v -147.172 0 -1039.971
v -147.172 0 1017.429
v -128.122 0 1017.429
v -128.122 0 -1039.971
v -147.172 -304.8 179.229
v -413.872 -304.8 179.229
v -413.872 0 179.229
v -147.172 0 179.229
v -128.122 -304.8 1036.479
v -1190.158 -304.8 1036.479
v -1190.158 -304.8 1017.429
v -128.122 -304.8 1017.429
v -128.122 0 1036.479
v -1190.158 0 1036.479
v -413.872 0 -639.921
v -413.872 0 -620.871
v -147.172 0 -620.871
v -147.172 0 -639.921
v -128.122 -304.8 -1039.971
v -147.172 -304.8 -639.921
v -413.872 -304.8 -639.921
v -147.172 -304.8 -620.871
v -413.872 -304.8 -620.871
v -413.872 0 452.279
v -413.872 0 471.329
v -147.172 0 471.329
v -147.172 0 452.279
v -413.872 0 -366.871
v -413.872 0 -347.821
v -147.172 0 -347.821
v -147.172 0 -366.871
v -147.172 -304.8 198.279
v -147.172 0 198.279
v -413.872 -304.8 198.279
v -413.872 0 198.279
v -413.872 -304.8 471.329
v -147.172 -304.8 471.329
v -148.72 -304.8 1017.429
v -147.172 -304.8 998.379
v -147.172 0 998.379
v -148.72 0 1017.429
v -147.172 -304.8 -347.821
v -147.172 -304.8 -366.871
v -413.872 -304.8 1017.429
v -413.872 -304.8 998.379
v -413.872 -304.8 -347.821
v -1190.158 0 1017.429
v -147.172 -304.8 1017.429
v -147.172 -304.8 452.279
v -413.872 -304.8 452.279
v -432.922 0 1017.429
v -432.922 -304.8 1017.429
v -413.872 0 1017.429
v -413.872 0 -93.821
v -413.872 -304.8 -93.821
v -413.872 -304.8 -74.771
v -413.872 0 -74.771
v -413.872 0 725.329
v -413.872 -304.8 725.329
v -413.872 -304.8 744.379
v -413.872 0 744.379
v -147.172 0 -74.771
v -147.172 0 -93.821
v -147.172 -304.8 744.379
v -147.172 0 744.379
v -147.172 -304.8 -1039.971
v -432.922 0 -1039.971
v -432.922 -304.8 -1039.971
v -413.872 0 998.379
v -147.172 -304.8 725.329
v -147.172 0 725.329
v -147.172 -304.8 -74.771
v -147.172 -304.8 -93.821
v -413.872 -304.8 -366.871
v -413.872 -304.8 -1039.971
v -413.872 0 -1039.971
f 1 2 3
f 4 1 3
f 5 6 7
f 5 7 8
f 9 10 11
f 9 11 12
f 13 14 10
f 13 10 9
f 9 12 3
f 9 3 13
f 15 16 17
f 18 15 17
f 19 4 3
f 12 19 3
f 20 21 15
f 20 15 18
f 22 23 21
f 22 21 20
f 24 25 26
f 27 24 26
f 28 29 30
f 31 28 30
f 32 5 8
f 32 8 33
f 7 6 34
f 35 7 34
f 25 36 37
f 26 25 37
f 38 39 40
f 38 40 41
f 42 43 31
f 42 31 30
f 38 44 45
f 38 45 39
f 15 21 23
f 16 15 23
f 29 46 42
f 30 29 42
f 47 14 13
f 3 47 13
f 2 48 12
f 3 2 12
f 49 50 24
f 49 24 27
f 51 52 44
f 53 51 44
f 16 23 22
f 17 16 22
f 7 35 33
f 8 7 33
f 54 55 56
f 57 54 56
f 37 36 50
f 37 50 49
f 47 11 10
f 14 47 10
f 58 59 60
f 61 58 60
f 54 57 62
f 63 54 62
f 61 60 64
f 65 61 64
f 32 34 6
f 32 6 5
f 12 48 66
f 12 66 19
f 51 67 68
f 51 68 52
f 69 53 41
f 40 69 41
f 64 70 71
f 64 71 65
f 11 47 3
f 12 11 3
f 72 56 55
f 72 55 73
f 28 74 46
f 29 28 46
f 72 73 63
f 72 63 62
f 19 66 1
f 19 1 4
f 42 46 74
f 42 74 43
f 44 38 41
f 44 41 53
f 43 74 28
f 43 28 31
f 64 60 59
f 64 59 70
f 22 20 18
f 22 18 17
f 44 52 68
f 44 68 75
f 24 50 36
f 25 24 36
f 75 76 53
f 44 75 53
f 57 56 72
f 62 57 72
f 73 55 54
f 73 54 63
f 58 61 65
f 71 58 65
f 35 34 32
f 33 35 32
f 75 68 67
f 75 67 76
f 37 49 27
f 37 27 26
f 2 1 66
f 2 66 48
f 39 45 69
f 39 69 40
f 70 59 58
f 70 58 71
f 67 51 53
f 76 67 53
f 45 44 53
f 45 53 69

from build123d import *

# Parameters (mm, degrees)
F0_W     = 19.05
F0_H     = 2057.4
F1_DEPTH = 304.8
F2_W     = 266.7
F2_H     = 19.05
F3_DEPTH = 304.8
F4_W     = 1062.035602
F4_H     = 19.05
F5_DEPTH = 304.8


with BuildPart() as f1:
    # F0 (on Front) → F1 (new body)
    with BuildSketch(Plane.XZ):
        with Locations((-423.397244, -11.271086)):
            Rectangle(F0_W, F0_H)
        with Locations((-137.647244, -11.271086)):
            Rectangle(F0_W, F0_H)
    extrude(amount=F1_DEPTH)


with BuildPart() as f3:
    # F2 (on face) → F3 (new body)
    with BuildSketch(Plane.XZ.offset(304.8)):
        with Locations((-280.522244, -630.396086)):
            Rectangle(F2_W, F2_H)
        with Locations((-280.522244, -357.346086)):
            Rectangle(F2_W, F2_H)
        with Locations((-280.522244, -84.296086)):
            Rectangle(F2_W, F2_H)
        with Locations((-280.522244, 188.753914)):
            Rectangle(F2_W, F2_H)
        with Locations((-280.522244, 461.803914)):
            Rectangle(F2_W, F2_H)
        with Locations((-280.522244, 734.853914)):
            Rectangle(F2_W, F2_H)
        Polygon((-148.719952, 1017.428914), (-413.872244, 1017.428914), (-413.872244, 998.378914), (-147.172244, 998.378914), align=None)
    extrude(amount=-F3_DEPTH)


with BuildPart() as f5:
    # F4 (on Front) → F5 (new body)
    with BuildSketch(Plane.XZ):
        with Locations((-659.140045, 1026.953914)):
            Rectangle(F4_W, F4_H)
    extrude(amount=F5_DEPTH)


solid = Compound([f1.part, f3.part, f5.part])
